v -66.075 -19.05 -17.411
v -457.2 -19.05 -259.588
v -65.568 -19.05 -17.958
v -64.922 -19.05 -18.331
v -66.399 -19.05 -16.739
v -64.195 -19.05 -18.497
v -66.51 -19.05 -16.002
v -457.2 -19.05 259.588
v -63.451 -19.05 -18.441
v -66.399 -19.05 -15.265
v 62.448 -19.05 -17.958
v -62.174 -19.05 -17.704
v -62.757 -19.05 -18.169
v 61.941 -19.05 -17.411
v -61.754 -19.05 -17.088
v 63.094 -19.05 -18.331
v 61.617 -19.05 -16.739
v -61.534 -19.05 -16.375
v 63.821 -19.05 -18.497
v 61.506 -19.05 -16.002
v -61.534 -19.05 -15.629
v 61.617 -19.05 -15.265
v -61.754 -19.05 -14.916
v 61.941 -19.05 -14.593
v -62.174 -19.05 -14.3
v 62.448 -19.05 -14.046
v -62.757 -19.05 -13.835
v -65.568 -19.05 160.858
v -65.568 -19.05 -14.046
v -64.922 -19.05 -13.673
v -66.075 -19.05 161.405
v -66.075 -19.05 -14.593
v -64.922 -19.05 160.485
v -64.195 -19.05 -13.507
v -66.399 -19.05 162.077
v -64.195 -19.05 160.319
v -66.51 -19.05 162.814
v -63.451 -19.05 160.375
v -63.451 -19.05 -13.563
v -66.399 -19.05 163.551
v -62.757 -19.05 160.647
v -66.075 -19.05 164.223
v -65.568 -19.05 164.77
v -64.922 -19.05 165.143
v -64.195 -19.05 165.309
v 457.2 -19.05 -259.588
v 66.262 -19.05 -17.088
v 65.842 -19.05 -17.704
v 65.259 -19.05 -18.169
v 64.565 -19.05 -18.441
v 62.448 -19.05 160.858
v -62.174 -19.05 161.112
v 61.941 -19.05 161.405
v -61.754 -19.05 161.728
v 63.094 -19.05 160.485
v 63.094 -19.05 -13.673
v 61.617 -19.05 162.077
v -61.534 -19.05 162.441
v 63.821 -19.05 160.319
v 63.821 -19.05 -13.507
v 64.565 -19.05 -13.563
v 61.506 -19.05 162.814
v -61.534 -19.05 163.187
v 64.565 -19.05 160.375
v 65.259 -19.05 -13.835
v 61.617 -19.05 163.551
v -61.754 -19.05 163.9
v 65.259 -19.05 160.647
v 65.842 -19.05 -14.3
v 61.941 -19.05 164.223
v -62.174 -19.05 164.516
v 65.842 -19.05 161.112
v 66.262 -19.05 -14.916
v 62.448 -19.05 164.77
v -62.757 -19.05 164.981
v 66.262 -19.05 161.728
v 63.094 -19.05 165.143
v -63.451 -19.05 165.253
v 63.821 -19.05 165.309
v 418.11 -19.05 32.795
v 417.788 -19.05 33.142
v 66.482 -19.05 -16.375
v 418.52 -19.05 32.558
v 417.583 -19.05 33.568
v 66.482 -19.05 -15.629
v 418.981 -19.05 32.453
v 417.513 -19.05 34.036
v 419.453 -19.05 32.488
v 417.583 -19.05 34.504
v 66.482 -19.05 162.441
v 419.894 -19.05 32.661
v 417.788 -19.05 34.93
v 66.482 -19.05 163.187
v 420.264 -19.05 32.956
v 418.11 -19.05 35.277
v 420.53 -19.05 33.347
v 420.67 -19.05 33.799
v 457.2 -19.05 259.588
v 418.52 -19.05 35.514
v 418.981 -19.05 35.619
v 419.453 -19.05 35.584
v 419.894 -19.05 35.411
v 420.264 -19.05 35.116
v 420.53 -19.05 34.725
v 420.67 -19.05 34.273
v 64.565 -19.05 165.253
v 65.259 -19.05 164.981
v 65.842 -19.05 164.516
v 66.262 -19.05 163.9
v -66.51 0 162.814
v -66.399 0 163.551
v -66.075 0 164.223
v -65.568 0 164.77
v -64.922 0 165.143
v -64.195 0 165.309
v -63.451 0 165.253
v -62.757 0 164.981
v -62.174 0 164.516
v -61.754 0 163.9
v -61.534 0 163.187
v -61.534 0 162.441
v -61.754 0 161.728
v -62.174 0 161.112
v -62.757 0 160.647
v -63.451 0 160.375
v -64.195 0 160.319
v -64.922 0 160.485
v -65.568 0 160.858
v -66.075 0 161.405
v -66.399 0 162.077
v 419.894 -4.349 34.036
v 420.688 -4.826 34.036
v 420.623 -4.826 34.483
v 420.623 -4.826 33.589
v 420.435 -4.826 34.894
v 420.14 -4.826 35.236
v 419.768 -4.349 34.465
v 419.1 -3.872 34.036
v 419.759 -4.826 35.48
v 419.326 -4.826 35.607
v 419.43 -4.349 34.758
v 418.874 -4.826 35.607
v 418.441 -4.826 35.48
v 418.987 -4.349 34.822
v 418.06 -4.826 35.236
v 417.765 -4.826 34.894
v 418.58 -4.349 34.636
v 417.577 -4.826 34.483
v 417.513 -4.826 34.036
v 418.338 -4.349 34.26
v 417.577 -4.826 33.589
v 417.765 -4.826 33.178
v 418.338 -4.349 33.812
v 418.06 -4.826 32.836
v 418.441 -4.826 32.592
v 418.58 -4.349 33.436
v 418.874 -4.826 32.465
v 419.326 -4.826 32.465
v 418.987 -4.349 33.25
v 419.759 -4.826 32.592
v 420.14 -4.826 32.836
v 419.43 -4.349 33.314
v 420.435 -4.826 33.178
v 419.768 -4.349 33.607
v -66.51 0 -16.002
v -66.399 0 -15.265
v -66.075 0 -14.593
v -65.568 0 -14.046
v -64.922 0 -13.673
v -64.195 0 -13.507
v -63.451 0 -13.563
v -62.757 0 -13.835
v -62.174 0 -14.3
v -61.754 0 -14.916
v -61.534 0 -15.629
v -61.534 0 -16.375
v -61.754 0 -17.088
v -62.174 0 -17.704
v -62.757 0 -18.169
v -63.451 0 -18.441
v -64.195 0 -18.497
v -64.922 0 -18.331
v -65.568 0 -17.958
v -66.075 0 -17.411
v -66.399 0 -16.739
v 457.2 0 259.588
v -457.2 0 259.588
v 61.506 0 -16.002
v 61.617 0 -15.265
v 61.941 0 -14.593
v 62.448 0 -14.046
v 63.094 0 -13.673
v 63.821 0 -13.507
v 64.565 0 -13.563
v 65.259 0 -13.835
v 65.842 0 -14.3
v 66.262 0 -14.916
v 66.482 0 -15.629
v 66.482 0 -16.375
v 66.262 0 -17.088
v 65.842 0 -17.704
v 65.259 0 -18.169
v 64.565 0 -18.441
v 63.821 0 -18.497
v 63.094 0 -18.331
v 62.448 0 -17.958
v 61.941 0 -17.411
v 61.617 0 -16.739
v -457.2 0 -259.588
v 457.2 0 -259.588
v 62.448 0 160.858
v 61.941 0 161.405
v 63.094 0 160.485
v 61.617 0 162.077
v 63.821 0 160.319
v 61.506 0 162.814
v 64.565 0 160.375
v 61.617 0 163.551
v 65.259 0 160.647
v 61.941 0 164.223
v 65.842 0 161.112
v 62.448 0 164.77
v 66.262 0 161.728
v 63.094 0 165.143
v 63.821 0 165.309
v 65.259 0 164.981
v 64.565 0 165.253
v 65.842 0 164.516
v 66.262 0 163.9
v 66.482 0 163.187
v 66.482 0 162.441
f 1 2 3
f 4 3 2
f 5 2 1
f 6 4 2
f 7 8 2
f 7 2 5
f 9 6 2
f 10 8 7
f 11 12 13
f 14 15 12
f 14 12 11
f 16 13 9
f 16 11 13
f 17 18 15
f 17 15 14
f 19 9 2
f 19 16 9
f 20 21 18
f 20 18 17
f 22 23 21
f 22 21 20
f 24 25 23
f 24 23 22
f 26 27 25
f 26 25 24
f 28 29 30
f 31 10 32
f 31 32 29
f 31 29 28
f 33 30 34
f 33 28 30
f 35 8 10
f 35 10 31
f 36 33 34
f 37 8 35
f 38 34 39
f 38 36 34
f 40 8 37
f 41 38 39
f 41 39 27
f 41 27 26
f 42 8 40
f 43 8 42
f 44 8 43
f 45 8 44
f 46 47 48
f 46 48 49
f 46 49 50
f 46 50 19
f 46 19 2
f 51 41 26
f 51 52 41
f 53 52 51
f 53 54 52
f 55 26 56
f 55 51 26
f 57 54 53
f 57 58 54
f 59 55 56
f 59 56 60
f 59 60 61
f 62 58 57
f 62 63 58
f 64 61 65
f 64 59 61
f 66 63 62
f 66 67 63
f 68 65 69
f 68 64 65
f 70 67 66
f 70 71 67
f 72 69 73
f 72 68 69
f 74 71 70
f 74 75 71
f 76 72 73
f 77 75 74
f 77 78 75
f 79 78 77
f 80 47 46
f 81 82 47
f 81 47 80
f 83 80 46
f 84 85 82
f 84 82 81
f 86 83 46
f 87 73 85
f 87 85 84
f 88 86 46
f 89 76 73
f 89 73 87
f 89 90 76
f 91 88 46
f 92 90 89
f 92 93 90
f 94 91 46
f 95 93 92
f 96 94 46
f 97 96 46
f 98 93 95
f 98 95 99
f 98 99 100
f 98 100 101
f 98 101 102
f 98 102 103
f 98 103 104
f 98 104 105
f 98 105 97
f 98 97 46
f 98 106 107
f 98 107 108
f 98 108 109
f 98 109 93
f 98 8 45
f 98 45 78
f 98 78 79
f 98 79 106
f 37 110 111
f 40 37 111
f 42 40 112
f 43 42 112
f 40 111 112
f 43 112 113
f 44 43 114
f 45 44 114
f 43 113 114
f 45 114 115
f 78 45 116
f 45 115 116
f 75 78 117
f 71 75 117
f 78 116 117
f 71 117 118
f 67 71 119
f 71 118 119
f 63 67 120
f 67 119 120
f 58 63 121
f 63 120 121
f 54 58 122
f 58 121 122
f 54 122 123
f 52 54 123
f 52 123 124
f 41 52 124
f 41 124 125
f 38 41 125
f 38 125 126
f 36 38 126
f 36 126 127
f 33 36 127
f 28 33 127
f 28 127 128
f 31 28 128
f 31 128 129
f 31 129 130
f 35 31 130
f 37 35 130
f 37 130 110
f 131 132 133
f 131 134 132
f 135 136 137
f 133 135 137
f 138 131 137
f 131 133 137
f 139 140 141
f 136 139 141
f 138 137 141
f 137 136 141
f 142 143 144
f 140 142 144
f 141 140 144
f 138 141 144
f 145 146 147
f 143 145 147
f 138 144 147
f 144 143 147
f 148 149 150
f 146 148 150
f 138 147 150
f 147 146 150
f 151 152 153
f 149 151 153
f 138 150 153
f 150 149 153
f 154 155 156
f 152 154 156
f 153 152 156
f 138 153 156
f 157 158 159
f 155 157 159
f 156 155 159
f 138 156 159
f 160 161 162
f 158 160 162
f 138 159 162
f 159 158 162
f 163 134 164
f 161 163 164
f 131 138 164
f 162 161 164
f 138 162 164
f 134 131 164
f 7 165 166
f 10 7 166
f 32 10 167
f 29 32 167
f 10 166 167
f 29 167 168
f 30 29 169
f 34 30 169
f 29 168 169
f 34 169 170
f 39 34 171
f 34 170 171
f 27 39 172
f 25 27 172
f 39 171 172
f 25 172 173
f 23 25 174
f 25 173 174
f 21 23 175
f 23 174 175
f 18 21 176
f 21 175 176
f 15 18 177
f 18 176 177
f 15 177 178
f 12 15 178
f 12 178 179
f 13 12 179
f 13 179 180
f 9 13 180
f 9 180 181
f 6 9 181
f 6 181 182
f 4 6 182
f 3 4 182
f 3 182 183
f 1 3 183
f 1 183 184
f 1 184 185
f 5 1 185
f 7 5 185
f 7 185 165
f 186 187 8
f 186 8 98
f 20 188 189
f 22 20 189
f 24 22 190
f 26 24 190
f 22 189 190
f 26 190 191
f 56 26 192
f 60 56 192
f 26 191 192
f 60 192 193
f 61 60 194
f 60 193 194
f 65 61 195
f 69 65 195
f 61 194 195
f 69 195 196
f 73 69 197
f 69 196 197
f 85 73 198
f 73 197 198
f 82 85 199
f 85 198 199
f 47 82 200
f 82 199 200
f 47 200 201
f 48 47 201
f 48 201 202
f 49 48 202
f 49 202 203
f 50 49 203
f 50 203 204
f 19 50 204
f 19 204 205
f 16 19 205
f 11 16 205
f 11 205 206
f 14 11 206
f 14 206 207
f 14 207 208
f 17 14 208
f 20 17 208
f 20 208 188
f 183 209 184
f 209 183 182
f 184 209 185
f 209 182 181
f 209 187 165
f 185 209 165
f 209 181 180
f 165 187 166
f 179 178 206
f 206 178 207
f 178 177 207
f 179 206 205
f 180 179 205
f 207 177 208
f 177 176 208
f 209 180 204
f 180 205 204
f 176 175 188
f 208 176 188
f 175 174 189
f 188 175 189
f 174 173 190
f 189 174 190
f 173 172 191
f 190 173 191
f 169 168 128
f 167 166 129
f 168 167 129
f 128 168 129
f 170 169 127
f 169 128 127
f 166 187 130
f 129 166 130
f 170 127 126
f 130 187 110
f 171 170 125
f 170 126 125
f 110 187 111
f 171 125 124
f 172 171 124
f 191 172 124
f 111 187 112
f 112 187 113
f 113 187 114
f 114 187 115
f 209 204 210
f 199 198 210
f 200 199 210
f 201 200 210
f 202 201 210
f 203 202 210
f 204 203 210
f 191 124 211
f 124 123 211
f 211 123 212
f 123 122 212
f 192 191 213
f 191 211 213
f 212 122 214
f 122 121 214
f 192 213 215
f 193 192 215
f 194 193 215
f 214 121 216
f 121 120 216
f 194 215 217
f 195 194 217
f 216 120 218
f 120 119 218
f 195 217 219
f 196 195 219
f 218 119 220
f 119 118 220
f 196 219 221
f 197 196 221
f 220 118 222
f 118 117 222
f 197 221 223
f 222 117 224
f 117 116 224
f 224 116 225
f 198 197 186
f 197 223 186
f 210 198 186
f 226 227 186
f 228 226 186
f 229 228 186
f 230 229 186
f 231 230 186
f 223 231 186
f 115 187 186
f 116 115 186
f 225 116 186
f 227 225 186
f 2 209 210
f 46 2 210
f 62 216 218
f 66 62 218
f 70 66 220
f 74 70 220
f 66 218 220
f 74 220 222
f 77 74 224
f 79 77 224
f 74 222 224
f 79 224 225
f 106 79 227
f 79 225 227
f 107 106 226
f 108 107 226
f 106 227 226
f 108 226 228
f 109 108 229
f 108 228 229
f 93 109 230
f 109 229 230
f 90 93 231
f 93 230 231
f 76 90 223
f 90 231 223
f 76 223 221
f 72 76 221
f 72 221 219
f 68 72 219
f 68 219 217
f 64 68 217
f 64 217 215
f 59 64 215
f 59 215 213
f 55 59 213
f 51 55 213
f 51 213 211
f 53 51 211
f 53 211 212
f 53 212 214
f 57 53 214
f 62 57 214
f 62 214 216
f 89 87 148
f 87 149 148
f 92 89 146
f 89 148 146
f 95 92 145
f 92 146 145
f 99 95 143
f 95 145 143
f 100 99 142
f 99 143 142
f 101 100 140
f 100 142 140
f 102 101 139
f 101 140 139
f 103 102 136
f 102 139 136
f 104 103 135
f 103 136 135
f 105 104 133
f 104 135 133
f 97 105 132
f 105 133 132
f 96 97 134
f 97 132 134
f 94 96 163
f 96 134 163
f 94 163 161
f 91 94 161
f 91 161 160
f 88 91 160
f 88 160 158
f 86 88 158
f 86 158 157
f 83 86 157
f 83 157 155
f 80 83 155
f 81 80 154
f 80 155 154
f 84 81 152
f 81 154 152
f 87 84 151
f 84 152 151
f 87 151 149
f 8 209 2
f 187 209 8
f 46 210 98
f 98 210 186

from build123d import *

# Parameters (mm, degrees)
F0_W     = 914.4
F0_H     = 519.176
F1_DEPTH = 19.05
F3_D     = 5.0038
F3_DEPTH = 25.4
F3_TIP   = 1.5032931827
F5_D     = 3.175
F5_DEPTH = 14.224
F5_TIP   = 0.9538662327


with BuildPart() as f1:
    # F0 (on Front) → F1 (new body)
    with BuildSketch(Plane.XZ):
        Rectangle(F0_W, F0_H)
    extrude(amount=F1_DEPTH)

    # F3
    with Locations(Plane.XZ.offset(19.05)):
        with Locations((-64.008, 162.814), (64.008, 162.814), (-64.008, -16.002), (64.008, -16.002)):
            Hole(F3_D / 2, depth=F3_DEPTH)
            with Locations((0, 0, -(F3_DEPTH + F3_TIP / 2))):  # 118° drill point
                Cone(0, F3_D / 2, F3_TIP, mode=Mode.SUBTRACT)

    # F5
    with Locations(Plane.XZ.offset(19.05)):
        with Locations((419.1, 34.036)):
            Hole(F5_D / 2, depth=F5_DEPTH)
            with Locations((0, 0, -(F5_DEPTH + F5_TIP / 2))):  # 118° drill point
                Cone(0, F5_D / 2, F5_TIP, mode=Mode.SUBTRACT)


solid = f1.part
